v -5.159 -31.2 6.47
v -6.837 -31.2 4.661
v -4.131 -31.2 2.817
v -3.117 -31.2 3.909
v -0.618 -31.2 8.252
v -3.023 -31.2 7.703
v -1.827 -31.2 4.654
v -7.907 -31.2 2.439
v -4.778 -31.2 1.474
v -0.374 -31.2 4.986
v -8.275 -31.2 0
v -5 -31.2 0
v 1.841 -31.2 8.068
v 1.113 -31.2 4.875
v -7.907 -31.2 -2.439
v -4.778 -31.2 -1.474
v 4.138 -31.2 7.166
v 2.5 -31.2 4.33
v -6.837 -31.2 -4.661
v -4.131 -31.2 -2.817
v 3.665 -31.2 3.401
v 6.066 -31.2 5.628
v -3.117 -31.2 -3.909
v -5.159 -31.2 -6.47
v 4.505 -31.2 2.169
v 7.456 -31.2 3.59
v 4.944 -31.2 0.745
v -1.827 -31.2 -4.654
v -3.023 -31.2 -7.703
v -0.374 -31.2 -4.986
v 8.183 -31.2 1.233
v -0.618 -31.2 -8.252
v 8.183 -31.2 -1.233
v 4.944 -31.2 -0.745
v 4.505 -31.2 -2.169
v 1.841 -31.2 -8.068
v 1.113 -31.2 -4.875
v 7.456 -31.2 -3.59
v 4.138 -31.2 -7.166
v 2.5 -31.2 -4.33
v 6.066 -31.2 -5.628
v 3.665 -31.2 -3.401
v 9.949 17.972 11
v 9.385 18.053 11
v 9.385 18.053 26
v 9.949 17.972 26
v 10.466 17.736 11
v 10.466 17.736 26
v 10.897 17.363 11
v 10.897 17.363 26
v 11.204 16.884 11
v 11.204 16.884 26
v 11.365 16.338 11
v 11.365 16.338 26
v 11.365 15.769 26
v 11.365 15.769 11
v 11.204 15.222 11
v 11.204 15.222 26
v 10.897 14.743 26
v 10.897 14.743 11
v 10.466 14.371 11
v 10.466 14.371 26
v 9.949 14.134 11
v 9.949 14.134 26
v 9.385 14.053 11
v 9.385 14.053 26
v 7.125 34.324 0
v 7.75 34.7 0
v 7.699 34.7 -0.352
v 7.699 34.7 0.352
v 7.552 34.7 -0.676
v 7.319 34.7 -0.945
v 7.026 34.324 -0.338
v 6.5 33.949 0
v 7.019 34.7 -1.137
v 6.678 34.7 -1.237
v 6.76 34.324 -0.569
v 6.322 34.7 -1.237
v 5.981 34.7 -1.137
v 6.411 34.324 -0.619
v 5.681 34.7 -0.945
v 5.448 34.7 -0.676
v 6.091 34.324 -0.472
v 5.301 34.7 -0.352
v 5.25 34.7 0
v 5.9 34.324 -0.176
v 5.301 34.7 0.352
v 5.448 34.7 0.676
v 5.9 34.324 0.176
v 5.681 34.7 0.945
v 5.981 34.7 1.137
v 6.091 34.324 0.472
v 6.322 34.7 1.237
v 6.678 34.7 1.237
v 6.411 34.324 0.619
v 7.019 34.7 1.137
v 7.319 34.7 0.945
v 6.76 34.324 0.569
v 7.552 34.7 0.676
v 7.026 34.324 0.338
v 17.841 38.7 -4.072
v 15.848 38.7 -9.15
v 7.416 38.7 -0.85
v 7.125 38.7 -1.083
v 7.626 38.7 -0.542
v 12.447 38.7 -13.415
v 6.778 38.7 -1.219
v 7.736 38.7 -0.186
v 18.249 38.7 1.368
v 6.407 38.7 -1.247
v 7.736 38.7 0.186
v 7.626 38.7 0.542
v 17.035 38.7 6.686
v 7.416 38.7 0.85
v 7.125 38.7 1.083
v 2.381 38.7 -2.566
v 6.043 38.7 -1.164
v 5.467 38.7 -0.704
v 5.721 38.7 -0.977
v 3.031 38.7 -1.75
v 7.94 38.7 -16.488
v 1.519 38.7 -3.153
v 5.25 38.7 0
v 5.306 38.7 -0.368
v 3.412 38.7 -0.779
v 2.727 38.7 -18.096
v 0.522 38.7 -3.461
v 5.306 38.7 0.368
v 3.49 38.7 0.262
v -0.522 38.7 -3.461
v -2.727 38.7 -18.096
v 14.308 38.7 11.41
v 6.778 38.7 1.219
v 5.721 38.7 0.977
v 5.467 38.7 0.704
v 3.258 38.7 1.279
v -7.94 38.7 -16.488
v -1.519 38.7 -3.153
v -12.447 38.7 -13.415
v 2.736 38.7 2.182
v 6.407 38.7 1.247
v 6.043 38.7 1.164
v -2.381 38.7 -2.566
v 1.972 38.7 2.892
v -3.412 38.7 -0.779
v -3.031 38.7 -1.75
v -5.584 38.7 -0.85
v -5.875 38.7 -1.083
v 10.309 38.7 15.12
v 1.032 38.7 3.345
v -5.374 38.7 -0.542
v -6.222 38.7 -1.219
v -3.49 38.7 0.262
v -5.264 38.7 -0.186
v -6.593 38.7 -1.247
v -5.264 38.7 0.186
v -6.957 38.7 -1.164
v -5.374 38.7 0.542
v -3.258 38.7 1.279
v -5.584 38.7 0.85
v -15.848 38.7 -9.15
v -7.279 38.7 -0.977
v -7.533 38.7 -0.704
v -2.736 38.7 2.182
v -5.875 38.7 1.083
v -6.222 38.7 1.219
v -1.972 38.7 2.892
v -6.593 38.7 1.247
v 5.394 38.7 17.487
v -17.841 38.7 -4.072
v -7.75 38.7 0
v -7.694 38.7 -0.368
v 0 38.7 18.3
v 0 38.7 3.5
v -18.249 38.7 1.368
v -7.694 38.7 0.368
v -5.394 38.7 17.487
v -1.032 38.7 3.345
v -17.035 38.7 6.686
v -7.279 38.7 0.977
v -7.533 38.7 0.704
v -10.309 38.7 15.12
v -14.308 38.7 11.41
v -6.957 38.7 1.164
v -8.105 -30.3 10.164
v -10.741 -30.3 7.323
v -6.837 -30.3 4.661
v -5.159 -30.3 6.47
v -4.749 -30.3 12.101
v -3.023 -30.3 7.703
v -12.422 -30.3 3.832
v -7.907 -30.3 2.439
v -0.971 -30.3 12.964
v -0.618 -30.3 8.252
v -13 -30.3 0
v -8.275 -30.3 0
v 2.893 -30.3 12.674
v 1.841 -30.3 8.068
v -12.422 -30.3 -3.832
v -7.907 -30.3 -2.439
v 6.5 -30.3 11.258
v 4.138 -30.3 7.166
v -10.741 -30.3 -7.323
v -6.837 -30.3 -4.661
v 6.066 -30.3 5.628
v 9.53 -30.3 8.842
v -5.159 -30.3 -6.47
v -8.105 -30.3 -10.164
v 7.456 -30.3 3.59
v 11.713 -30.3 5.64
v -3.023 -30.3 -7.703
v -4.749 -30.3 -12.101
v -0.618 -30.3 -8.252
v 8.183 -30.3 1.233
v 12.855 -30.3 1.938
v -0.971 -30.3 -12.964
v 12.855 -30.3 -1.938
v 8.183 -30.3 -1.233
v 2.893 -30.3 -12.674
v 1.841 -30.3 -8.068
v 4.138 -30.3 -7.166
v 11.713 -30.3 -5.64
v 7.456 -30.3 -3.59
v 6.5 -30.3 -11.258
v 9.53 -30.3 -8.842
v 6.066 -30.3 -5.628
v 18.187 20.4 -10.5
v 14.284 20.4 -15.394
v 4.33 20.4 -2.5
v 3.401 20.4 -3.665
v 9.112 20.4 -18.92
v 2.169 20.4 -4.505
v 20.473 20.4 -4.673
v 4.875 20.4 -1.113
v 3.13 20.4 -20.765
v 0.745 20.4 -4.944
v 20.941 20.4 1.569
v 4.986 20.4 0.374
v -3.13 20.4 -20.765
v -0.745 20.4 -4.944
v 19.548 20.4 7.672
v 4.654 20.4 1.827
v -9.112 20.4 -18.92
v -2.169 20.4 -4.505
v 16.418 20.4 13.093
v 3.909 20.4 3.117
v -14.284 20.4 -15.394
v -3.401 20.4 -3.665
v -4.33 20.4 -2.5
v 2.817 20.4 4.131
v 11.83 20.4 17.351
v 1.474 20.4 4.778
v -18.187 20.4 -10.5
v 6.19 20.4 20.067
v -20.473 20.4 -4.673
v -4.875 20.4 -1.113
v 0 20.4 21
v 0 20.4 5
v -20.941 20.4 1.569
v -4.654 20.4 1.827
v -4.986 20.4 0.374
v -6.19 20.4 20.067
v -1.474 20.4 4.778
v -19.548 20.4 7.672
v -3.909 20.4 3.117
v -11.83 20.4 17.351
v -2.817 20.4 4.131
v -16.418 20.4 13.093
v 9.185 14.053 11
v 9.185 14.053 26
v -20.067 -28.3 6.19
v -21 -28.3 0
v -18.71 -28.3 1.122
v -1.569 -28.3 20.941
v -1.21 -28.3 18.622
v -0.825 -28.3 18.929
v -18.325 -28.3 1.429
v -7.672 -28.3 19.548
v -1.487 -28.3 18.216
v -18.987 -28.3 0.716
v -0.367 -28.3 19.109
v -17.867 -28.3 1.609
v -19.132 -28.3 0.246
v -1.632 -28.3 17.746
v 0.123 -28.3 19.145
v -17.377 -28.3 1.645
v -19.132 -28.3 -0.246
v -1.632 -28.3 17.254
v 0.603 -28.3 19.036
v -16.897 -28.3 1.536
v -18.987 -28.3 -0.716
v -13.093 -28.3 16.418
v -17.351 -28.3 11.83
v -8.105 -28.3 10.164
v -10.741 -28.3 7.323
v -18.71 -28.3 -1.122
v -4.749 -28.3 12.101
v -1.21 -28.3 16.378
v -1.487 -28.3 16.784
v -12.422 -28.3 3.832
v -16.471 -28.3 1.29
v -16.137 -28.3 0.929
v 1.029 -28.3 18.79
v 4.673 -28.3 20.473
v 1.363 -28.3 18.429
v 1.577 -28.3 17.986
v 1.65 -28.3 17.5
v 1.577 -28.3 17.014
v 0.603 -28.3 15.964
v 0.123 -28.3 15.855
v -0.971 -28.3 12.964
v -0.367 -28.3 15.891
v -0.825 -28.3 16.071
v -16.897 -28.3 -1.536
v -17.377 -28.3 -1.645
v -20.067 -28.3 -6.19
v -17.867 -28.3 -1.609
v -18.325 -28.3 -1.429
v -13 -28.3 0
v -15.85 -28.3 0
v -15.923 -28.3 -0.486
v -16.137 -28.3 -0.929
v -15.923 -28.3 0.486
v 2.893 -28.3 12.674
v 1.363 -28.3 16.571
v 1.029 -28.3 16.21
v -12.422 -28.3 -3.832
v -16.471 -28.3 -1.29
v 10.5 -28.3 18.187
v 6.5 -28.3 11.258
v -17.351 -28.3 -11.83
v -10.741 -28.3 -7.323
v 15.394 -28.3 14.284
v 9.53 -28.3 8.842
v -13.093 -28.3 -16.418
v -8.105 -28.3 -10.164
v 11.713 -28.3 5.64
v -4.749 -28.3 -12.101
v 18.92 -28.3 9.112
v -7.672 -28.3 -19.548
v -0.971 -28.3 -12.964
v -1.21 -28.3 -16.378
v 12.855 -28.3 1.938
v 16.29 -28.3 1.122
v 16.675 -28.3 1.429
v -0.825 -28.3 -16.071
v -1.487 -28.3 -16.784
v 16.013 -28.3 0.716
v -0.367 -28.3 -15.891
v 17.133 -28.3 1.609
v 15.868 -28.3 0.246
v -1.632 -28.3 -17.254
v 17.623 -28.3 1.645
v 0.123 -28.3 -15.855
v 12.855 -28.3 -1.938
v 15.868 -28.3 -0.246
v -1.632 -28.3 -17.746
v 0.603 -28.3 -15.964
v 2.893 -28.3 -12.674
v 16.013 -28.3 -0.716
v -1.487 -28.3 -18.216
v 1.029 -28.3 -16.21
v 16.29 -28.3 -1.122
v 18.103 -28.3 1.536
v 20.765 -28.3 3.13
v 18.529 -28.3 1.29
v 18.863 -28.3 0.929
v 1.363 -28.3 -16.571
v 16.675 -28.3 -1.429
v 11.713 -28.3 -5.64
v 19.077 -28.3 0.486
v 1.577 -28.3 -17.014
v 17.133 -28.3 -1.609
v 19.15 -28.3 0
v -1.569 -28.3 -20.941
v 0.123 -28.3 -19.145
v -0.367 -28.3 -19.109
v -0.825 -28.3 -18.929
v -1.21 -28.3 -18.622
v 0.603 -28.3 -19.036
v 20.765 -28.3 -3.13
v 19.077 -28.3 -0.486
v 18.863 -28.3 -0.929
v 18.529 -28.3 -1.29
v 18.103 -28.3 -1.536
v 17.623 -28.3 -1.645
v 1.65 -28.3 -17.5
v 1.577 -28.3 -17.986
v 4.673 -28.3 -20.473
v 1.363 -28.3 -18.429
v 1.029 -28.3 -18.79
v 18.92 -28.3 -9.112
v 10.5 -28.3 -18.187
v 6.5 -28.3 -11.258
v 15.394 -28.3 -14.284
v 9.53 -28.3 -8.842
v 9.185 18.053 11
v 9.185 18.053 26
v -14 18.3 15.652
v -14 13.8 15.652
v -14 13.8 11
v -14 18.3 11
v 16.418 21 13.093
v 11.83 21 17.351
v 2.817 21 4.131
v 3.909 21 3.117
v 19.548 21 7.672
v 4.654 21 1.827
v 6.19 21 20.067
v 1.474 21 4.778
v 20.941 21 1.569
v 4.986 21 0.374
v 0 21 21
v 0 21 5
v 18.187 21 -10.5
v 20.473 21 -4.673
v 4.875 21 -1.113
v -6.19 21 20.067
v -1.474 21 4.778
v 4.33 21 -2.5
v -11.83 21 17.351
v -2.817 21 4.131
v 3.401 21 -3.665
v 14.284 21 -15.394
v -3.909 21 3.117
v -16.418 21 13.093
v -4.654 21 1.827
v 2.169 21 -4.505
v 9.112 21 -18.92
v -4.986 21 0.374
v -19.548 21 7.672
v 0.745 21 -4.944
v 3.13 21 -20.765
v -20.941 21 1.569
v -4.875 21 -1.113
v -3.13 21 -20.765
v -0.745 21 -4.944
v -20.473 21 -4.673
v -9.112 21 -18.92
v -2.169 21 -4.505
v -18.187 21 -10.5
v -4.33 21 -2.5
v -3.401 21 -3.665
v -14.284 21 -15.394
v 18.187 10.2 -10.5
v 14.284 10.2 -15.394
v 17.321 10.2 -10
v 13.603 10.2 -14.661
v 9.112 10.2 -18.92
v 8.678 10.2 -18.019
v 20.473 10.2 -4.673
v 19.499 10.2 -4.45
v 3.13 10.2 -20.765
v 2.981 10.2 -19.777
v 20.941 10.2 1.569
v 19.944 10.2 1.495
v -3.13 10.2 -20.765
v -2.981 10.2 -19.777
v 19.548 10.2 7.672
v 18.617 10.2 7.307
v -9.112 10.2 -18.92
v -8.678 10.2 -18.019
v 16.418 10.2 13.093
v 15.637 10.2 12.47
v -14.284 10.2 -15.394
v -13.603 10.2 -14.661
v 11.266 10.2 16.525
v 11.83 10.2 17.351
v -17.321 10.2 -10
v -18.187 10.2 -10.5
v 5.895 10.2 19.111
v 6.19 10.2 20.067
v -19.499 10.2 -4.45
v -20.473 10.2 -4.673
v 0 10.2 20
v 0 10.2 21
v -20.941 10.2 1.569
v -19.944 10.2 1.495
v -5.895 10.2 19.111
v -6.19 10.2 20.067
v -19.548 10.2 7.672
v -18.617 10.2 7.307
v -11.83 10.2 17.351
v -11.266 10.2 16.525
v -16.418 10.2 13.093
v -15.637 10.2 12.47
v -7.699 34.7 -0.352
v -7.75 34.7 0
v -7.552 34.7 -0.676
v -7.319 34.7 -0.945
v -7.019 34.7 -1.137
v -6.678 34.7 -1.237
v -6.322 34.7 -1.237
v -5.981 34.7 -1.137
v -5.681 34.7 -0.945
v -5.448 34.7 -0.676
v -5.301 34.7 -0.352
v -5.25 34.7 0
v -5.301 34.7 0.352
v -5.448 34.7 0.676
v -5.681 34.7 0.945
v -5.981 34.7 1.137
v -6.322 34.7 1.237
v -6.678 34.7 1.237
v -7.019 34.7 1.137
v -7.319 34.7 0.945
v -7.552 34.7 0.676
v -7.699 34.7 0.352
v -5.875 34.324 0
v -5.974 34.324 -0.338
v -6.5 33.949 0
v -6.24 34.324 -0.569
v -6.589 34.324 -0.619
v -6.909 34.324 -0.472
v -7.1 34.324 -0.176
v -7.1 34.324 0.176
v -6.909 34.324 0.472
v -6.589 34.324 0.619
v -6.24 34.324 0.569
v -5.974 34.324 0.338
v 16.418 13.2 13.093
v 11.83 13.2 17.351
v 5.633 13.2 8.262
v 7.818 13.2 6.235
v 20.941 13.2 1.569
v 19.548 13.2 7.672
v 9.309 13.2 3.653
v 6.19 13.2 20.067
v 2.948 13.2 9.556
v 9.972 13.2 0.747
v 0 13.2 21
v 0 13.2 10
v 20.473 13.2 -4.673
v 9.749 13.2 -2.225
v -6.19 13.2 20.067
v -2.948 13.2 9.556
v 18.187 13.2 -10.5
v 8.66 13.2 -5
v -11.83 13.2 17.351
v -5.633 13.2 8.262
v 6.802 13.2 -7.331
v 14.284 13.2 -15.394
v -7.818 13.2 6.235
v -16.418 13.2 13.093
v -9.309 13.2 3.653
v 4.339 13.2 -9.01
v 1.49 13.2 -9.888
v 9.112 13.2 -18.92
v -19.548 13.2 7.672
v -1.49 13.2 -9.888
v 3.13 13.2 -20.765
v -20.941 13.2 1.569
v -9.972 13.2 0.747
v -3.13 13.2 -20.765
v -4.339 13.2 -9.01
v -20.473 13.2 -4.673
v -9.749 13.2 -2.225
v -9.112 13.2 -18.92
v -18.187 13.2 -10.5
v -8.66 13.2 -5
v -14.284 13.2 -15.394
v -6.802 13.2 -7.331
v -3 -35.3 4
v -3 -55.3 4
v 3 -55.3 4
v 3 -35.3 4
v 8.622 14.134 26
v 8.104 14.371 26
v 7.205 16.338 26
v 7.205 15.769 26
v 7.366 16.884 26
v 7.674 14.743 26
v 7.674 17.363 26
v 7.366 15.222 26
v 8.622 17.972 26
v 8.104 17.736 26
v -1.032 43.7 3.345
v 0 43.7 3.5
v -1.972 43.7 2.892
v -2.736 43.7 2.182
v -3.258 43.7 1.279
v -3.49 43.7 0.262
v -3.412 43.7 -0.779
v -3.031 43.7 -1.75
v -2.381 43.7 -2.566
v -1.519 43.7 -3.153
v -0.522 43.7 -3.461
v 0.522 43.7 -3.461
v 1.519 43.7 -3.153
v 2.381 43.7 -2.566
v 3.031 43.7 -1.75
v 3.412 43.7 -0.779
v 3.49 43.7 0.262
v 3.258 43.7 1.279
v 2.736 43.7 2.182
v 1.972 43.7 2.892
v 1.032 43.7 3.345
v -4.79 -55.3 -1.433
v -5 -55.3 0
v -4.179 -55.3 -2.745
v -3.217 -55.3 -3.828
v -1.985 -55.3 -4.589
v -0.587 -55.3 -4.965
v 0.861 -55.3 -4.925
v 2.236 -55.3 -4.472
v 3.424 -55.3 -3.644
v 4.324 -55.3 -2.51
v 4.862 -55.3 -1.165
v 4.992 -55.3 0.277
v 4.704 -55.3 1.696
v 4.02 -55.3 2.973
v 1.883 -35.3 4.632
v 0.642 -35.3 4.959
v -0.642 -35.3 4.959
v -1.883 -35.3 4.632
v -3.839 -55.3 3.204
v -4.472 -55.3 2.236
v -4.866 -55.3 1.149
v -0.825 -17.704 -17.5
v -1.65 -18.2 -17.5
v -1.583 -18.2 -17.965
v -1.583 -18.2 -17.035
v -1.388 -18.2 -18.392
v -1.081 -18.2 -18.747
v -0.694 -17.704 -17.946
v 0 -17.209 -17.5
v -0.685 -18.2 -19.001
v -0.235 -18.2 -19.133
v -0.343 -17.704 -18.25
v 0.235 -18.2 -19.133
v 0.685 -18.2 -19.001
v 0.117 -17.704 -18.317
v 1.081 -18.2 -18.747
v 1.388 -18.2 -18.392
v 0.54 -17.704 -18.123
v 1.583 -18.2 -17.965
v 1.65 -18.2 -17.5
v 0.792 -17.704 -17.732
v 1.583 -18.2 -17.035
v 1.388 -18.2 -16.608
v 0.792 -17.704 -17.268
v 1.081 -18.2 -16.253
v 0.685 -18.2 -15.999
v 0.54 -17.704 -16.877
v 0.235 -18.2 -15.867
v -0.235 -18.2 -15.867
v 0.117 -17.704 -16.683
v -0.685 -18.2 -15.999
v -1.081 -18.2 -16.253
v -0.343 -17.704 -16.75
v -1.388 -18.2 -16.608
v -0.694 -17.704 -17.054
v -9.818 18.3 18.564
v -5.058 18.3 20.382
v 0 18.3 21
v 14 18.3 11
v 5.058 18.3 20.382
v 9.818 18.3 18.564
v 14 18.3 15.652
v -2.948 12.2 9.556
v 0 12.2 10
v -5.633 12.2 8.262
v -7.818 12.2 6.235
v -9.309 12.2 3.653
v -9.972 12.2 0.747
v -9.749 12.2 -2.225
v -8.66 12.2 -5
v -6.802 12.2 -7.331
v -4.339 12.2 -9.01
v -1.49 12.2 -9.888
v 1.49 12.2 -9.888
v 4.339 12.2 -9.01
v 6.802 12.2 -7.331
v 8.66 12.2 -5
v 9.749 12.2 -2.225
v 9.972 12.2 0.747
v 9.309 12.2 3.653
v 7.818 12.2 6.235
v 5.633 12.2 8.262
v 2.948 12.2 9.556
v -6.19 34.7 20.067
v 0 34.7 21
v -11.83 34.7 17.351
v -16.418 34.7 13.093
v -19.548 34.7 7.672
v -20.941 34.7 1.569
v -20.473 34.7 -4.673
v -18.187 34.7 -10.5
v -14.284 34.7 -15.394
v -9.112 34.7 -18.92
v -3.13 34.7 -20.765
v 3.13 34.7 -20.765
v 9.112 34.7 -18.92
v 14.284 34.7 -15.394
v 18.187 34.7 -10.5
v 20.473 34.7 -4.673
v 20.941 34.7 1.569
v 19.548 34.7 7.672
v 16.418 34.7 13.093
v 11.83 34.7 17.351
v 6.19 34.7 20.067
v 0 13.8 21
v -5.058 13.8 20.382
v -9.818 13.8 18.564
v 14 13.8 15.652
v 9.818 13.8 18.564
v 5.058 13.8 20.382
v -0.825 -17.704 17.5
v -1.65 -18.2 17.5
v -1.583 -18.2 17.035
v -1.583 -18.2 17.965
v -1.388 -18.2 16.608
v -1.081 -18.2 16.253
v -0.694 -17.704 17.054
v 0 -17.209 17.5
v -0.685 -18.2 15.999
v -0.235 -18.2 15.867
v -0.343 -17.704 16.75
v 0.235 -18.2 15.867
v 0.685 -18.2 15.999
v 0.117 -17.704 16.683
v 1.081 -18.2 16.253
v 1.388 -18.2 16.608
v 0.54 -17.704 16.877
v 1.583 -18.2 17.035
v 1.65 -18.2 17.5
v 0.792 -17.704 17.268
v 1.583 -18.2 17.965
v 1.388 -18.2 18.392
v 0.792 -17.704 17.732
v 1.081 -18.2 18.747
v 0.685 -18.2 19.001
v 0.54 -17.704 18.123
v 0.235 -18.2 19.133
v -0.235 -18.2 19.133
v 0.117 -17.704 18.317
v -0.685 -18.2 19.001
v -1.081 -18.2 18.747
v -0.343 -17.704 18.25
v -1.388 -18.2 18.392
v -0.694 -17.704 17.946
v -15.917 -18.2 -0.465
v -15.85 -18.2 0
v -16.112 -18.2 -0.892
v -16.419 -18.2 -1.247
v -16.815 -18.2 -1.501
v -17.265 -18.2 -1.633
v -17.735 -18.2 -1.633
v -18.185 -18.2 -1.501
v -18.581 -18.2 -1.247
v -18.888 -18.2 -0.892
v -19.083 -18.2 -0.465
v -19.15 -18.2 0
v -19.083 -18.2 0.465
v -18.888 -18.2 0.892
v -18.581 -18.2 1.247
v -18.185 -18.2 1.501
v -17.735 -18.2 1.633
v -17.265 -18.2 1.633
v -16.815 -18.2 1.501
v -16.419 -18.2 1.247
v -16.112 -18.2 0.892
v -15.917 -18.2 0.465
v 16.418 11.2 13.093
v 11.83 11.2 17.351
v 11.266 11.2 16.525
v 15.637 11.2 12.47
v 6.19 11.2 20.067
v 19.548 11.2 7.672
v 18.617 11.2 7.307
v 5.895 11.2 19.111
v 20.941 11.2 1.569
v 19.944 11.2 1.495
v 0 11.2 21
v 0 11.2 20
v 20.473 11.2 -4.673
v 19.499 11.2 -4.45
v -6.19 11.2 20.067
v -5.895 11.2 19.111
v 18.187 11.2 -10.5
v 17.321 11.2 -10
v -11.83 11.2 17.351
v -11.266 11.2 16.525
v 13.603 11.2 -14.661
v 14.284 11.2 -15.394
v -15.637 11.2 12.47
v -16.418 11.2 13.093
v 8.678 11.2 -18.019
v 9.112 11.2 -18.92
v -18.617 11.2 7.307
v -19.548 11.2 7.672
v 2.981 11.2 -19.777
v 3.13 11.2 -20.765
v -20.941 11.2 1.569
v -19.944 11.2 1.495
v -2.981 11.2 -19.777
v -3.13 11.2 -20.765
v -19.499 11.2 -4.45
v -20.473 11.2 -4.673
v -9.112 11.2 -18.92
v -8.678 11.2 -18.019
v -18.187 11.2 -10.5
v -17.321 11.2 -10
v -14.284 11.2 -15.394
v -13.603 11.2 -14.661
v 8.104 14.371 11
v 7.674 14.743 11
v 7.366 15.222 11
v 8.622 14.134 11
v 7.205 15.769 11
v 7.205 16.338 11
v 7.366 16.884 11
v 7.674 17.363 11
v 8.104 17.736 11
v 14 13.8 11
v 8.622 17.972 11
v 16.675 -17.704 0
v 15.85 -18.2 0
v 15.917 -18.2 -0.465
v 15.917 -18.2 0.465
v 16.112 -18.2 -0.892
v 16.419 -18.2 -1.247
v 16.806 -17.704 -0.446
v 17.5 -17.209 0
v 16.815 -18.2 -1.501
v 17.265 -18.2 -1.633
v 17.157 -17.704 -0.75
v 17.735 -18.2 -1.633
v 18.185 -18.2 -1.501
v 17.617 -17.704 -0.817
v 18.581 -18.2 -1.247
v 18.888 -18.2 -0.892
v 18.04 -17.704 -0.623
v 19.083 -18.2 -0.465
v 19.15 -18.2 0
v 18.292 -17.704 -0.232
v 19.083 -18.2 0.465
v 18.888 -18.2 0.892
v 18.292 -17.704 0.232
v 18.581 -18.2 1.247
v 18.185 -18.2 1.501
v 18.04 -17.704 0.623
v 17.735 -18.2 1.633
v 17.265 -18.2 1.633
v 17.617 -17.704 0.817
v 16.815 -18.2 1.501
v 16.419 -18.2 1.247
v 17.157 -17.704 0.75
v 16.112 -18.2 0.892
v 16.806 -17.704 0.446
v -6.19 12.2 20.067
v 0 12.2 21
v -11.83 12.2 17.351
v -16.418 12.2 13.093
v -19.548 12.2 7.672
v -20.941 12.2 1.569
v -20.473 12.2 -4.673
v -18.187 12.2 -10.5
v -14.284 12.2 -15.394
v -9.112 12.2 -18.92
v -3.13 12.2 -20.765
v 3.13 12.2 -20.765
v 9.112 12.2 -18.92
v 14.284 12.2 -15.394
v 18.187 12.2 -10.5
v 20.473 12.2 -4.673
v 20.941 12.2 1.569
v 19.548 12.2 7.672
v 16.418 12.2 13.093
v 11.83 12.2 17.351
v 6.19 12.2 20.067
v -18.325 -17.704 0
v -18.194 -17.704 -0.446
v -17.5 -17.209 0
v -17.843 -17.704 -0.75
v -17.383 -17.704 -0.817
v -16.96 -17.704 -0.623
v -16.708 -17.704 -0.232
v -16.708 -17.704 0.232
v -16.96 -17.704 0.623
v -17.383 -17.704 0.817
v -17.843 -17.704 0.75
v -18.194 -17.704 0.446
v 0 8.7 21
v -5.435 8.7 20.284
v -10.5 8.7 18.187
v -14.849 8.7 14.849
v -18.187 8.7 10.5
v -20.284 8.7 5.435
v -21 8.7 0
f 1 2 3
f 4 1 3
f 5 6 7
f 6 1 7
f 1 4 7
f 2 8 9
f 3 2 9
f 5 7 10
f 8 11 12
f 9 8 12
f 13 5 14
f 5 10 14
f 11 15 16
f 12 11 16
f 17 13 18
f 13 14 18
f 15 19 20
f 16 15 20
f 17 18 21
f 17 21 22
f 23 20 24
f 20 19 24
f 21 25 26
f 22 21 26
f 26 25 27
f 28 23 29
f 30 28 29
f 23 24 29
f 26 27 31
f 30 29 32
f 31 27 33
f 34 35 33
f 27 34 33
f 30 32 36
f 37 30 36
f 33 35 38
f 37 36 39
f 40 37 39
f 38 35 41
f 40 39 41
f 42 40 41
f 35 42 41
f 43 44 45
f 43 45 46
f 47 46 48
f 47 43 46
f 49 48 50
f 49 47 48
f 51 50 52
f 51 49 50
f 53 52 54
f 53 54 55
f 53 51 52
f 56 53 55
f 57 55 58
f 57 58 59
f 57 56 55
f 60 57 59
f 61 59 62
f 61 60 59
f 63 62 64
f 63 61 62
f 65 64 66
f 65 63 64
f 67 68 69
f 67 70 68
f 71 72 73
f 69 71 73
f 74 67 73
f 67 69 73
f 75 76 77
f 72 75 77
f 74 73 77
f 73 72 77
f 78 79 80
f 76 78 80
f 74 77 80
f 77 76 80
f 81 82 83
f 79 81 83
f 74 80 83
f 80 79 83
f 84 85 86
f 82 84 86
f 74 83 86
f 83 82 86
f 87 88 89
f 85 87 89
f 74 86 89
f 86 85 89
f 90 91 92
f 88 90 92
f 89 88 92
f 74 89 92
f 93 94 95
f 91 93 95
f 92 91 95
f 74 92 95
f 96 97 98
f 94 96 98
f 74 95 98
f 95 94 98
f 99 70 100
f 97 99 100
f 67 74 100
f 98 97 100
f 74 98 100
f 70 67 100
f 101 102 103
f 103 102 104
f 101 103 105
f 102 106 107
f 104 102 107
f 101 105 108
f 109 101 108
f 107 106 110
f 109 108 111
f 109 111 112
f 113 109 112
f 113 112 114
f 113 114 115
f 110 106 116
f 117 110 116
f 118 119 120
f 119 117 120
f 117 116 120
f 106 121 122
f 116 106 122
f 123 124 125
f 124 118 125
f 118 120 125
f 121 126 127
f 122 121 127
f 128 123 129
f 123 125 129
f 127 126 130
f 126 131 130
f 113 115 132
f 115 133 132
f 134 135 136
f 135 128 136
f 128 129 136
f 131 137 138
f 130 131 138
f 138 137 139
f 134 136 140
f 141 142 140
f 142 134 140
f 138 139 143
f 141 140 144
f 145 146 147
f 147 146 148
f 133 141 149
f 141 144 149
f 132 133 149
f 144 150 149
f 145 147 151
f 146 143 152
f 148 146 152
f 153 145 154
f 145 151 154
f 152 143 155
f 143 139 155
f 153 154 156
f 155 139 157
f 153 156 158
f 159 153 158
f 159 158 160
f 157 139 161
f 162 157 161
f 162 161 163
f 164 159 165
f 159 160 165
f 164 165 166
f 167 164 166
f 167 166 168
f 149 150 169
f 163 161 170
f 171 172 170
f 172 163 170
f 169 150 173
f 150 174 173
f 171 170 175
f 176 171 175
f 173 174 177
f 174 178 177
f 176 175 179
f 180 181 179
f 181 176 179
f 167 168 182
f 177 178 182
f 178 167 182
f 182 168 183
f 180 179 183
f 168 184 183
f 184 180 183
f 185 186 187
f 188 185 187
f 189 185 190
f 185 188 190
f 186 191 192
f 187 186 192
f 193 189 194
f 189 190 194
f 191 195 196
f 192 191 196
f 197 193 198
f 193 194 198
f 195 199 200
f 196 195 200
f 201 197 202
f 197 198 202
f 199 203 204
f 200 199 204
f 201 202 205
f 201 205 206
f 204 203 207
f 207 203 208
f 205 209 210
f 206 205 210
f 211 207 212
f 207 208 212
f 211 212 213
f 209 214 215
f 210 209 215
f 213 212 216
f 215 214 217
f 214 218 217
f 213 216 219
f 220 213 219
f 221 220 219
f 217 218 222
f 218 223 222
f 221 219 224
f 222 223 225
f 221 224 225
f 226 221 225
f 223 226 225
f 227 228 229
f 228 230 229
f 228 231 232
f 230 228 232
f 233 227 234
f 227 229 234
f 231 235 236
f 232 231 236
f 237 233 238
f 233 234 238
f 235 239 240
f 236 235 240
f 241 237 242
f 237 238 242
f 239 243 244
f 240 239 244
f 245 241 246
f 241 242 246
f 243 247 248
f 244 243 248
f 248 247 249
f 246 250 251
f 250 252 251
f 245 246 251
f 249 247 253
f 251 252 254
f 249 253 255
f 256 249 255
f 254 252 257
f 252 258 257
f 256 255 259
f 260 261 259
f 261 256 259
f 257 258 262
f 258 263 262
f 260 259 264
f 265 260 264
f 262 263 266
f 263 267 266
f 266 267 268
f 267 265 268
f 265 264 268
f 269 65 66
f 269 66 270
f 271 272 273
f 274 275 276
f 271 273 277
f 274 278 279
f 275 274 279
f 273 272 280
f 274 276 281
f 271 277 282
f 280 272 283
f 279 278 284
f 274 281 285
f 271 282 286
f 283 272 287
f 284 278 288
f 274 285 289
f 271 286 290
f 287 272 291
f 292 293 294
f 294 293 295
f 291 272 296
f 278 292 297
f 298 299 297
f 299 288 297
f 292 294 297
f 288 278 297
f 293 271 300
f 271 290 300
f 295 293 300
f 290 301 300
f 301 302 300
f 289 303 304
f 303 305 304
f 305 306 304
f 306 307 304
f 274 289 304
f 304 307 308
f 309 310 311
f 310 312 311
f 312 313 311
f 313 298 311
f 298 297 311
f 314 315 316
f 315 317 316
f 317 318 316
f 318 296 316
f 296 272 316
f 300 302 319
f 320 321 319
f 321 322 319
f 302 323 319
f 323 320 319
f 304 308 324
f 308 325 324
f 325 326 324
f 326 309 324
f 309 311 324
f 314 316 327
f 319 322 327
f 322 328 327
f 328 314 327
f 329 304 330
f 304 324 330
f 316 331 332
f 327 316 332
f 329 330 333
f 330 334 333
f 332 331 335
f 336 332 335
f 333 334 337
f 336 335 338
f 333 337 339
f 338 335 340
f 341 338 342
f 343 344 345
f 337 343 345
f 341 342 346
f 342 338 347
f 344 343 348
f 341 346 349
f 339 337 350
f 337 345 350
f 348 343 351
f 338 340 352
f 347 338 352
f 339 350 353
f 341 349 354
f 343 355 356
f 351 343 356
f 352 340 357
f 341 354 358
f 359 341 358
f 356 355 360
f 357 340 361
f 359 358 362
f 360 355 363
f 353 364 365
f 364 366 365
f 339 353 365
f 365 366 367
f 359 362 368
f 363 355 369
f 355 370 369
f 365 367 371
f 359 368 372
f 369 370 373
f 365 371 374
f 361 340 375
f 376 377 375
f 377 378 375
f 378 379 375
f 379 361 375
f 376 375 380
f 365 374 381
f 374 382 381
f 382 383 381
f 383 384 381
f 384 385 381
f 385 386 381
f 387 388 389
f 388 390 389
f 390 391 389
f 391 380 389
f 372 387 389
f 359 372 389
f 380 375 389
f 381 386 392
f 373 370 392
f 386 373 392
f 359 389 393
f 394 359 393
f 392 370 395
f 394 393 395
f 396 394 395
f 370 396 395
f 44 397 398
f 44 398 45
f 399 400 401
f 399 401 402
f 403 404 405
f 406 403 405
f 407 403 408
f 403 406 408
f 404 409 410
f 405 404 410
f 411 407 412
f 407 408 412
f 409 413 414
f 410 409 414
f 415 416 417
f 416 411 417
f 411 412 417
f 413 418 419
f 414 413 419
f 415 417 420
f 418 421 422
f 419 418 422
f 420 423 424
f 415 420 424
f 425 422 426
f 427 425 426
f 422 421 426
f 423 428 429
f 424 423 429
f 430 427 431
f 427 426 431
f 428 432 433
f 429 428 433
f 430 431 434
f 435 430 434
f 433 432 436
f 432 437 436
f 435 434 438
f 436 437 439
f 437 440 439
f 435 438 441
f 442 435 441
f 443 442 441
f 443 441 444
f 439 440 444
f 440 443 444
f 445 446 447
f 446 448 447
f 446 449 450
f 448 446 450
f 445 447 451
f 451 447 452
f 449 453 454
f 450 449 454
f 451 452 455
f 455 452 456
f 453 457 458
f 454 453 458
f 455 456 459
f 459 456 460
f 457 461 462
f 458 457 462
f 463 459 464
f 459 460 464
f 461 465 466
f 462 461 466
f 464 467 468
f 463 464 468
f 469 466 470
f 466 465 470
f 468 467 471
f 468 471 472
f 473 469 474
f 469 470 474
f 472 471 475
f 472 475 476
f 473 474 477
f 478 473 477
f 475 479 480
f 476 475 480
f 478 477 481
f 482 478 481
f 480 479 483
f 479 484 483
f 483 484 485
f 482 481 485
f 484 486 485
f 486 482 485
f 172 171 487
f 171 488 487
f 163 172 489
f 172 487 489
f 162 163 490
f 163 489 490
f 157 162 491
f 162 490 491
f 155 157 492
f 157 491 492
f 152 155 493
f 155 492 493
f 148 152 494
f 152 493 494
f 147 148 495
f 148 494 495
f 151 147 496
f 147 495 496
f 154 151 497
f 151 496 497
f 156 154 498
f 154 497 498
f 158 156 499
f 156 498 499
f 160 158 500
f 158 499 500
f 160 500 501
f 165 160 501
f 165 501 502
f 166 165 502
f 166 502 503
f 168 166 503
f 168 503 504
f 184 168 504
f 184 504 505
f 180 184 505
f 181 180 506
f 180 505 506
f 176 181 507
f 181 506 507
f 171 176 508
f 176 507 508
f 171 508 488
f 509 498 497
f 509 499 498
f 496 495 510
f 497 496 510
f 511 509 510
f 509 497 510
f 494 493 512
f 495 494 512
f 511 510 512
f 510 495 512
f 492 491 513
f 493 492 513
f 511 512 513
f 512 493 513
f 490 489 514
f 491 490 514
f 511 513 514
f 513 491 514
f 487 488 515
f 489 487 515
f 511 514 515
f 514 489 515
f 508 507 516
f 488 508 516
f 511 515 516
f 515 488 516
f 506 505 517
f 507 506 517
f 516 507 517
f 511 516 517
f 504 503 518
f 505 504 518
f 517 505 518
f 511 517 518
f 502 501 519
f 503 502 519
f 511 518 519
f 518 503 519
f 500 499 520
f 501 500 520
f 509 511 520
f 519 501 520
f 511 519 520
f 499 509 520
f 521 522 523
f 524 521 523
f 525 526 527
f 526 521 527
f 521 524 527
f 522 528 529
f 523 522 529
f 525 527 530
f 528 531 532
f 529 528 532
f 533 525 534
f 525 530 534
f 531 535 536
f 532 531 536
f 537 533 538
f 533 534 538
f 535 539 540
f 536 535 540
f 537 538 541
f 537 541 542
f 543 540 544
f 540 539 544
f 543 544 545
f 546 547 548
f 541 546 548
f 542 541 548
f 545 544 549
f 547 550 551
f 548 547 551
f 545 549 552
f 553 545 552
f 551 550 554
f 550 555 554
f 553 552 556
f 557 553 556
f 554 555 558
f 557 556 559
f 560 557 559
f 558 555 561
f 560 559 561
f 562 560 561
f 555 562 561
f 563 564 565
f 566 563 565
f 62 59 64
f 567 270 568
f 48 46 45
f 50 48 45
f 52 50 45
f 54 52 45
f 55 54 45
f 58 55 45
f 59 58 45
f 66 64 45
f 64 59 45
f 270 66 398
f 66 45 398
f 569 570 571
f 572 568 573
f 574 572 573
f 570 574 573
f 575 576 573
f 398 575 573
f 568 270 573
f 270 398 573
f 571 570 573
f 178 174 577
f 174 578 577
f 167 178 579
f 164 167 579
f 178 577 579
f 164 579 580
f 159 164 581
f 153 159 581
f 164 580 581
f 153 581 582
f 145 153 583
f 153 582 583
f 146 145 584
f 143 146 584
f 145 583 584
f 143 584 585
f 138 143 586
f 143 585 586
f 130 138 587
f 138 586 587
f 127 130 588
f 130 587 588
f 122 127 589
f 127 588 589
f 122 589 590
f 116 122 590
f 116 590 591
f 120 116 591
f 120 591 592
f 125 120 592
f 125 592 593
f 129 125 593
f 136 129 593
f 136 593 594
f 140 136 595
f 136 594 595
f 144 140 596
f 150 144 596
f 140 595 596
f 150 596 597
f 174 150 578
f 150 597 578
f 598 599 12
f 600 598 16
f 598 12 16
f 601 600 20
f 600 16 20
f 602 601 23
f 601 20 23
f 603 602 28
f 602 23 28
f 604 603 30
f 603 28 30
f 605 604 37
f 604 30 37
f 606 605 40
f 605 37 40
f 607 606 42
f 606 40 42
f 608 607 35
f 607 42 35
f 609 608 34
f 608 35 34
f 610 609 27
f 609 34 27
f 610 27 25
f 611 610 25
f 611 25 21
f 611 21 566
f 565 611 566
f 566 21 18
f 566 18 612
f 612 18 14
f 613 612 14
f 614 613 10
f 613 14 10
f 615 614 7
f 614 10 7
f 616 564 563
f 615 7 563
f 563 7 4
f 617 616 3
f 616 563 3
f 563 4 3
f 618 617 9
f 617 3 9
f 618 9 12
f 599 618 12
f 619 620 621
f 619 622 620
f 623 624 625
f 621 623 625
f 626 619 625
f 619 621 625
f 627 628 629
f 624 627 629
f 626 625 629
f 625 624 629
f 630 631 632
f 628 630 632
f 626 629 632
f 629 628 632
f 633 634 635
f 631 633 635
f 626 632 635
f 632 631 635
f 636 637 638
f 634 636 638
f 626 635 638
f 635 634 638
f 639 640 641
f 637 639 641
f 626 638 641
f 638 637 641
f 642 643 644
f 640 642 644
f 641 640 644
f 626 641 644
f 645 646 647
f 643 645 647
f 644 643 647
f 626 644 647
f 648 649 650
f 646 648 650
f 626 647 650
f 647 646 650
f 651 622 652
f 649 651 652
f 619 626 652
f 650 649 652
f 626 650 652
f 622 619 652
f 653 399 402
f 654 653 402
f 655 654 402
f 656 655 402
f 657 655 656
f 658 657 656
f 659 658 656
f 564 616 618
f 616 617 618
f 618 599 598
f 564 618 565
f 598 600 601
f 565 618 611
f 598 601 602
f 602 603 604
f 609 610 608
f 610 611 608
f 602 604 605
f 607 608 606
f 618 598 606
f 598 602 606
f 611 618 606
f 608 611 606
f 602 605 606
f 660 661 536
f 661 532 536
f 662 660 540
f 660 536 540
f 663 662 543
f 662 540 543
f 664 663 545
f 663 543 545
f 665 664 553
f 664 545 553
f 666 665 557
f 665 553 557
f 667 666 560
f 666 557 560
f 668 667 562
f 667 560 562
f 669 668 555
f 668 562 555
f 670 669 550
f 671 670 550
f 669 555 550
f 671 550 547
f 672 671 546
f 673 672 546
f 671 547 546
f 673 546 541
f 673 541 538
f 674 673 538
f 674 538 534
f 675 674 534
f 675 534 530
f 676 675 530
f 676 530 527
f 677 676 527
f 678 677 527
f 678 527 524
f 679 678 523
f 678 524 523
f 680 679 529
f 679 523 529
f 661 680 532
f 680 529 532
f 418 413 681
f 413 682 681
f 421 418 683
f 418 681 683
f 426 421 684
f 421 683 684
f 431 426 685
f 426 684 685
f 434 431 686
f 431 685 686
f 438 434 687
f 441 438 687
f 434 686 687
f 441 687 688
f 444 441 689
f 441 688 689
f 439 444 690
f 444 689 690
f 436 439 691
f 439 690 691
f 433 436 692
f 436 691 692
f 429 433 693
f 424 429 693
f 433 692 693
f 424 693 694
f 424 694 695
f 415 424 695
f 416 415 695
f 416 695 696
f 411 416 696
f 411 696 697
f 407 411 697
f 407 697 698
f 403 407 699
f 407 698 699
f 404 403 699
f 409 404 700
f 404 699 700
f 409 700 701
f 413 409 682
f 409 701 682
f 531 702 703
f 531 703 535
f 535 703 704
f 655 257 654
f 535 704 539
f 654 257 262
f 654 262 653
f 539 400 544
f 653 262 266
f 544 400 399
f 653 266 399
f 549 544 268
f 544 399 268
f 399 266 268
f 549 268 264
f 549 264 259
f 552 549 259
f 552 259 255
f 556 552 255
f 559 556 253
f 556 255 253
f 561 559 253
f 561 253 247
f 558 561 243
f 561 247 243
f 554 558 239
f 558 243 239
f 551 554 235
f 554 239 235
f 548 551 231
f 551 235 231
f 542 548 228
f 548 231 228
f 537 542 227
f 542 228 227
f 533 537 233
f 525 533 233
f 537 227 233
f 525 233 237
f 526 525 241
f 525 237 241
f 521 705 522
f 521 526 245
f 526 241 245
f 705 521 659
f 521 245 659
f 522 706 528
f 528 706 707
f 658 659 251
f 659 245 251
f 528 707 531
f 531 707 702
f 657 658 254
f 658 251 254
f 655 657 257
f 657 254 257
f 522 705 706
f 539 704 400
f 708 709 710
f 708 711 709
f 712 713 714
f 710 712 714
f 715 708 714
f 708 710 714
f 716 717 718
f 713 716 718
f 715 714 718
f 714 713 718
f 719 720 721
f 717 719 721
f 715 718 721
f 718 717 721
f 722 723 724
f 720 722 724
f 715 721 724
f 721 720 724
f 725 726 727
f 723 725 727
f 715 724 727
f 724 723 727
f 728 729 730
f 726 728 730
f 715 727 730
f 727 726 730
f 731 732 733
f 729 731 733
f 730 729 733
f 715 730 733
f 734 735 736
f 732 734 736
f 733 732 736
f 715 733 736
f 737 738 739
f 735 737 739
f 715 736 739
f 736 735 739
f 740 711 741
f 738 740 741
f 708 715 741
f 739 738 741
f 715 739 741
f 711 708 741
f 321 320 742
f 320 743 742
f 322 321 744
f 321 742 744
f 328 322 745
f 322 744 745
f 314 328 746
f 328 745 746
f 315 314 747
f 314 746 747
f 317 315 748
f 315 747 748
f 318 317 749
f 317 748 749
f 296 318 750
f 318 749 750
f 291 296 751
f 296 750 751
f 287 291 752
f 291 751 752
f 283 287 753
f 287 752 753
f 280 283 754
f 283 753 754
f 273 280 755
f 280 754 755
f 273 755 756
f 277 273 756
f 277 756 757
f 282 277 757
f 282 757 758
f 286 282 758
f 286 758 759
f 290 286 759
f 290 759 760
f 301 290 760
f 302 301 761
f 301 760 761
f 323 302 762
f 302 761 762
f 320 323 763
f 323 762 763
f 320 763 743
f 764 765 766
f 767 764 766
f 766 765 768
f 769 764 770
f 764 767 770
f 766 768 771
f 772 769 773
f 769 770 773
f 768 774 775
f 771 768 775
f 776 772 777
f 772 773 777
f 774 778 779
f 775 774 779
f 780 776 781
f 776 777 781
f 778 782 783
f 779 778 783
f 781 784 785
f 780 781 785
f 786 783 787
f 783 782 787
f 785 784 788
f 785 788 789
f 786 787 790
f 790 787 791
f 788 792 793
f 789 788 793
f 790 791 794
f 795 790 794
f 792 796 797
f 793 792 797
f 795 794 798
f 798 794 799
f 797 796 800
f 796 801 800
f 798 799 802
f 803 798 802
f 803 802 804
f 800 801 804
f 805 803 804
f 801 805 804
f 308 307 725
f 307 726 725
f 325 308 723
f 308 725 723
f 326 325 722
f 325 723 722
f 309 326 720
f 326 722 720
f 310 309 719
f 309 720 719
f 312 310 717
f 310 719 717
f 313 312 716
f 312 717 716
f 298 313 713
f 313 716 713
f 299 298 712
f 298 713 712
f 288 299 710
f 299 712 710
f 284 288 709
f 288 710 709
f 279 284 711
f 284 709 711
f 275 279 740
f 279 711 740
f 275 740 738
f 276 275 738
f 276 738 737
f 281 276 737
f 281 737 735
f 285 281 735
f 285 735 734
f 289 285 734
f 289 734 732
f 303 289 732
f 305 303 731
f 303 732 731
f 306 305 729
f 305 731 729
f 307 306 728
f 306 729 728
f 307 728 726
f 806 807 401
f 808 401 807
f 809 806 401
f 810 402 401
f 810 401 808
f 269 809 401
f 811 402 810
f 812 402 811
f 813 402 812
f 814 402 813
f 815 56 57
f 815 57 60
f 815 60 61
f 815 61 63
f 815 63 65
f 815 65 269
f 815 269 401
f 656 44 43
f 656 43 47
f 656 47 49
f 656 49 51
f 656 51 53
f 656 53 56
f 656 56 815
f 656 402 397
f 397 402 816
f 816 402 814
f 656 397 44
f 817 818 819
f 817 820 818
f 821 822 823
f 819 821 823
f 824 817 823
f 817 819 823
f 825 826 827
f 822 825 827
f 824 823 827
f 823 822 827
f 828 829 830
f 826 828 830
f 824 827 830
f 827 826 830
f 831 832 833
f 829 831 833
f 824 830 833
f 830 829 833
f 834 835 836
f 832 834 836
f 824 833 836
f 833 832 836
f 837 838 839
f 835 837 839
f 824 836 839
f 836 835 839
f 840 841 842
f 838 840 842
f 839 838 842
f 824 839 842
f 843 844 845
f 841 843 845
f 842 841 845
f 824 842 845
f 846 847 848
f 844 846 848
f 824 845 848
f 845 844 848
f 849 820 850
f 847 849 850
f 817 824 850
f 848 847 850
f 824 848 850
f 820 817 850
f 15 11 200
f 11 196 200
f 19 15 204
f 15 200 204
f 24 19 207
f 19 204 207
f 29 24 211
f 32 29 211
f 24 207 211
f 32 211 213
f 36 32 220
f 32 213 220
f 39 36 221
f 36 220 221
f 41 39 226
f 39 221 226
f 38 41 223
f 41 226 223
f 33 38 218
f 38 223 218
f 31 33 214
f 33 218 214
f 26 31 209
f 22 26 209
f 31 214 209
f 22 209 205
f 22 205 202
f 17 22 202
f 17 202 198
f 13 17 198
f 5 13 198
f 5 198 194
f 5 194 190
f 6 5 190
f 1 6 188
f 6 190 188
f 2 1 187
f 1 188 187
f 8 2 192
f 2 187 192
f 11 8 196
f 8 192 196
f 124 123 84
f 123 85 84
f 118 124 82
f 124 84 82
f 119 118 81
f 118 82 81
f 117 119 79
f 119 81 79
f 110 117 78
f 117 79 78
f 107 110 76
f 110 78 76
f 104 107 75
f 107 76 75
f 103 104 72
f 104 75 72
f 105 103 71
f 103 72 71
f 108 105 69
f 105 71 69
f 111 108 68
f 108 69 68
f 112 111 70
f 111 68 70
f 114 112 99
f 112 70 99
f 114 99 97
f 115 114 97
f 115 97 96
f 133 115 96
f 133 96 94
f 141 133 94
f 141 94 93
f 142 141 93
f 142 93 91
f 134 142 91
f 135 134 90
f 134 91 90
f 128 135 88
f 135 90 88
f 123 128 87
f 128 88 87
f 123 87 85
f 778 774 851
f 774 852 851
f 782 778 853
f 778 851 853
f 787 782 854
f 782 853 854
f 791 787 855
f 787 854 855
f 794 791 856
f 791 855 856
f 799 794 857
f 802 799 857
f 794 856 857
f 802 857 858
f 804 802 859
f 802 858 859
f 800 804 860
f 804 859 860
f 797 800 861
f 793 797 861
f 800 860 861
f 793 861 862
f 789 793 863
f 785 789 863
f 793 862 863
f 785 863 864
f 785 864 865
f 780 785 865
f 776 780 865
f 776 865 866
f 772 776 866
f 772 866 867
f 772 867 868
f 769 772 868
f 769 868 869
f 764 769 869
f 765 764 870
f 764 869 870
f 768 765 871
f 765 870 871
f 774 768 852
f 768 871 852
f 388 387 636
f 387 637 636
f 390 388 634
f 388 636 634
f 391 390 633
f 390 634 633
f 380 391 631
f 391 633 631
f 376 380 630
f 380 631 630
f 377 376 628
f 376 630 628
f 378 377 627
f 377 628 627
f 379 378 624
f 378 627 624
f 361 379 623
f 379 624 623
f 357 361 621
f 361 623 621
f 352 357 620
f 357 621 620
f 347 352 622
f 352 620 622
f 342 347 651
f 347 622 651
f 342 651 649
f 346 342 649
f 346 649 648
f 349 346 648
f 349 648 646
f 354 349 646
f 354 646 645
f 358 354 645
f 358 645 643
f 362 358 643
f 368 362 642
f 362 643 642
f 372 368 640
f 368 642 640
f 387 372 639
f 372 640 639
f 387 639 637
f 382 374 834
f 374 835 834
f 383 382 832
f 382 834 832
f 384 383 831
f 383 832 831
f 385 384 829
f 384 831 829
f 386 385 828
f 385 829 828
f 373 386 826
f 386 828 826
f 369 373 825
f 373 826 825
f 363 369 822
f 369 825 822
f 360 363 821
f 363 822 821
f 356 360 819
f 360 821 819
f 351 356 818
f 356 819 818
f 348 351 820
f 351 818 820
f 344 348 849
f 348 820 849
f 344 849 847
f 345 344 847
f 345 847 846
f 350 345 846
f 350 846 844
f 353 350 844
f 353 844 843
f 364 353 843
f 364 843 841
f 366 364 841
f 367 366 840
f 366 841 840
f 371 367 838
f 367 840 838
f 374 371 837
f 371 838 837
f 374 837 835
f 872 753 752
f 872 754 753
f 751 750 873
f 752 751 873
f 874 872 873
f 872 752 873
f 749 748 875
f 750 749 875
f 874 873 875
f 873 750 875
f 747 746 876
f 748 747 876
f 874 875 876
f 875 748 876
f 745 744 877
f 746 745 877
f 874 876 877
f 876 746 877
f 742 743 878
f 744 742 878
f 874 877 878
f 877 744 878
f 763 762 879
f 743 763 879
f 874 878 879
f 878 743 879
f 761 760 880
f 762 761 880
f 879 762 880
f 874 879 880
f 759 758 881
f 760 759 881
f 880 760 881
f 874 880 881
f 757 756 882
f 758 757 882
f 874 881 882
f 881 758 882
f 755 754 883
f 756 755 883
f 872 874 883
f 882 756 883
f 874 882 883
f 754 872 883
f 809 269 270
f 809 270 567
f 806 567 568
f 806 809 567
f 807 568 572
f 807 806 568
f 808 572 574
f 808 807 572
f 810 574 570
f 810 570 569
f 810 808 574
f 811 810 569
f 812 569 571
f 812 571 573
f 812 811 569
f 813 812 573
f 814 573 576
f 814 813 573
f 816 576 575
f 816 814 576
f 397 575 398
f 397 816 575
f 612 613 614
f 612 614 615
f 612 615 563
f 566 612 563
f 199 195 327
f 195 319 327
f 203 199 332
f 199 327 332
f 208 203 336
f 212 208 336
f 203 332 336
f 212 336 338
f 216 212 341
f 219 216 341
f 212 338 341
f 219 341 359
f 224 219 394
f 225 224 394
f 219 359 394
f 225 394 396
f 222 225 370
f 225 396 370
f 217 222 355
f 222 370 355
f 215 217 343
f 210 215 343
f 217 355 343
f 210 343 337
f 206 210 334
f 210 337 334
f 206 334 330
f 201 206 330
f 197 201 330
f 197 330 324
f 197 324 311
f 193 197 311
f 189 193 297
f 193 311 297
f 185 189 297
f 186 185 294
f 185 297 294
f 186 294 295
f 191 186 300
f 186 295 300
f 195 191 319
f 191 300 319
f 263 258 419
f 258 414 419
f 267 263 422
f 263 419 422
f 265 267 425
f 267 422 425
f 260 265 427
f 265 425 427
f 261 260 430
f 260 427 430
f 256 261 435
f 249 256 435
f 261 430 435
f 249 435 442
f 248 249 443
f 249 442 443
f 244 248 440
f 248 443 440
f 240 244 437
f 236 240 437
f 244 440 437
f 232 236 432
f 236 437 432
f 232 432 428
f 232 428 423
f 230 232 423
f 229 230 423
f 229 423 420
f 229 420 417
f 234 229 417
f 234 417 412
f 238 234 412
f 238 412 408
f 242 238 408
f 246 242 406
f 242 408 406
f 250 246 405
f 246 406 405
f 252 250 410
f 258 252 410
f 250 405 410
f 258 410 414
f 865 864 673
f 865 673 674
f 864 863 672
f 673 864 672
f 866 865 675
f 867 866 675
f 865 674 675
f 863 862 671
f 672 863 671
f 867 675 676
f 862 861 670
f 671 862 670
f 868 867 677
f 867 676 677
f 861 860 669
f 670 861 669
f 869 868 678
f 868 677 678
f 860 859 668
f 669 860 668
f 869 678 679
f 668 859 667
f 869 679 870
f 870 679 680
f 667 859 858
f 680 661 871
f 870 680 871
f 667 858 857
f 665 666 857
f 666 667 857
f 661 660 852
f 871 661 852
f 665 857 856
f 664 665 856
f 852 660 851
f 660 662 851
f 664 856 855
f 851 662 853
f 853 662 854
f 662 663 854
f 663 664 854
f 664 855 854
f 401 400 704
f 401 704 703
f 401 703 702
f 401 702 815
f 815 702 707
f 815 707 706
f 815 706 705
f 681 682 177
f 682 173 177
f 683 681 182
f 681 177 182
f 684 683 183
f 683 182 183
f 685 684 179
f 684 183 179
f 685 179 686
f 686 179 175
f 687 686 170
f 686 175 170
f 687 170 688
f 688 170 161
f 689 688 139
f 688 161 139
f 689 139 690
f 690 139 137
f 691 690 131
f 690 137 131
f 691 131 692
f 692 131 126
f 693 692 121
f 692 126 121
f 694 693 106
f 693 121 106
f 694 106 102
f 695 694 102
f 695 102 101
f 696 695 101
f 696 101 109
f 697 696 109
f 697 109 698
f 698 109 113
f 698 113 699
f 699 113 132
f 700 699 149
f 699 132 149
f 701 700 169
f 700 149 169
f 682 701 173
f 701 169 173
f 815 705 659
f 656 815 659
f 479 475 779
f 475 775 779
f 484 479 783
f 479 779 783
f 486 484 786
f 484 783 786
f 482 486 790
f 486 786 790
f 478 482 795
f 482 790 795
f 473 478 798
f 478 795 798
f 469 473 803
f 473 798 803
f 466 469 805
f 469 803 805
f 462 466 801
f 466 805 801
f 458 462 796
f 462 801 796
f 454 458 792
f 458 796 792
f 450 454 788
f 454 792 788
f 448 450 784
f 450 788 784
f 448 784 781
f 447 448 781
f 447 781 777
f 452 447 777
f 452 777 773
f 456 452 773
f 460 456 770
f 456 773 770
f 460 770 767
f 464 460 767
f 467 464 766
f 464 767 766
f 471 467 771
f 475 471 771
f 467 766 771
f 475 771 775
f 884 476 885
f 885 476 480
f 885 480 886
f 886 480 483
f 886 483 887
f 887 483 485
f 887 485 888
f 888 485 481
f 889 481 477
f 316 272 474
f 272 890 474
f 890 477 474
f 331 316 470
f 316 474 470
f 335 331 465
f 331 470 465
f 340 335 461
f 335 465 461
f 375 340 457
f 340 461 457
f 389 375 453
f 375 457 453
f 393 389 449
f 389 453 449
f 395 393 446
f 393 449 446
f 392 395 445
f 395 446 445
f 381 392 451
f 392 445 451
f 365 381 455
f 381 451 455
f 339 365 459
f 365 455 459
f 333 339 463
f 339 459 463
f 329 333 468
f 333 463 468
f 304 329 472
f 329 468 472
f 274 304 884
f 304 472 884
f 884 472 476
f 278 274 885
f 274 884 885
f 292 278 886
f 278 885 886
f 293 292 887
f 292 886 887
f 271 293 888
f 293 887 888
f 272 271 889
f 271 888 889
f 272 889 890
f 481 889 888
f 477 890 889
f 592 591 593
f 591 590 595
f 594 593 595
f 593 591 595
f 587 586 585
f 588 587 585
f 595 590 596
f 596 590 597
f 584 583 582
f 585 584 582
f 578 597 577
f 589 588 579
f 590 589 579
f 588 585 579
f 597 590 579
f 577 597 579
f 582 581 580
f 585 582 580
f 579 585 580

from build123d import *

# Parameters (mm, degrees)
SKETCH_2_W             = 28
SKETCH_2_H             = 4.5
CUT_EXTRUDE_1_DEPTH    = 10
EXTRUDE_1_DEPTH        = 15
HOLE_WIZARD_M3_1_D     = 2.5
HOLE_WIZARD_M3_1_DEPTH = 4
HOLE_WIZARD_M3_1_TIP   = 0.751075774
CUT_EXTRUDE_START      = -20
CUT_EXTRUDE_2_DEPTH    = 20
HOLE_WIZARD_M4_1_D     = 3.3
HOLE_WIZARD_M4_1_DEPTH = 10.1
HOLE_WIZARD_M4_1_TIP   = 0.991420021


with BuildPart() as part:
    # 草图1 → 旋转1 (revolve)
    with BuildSketch(Plane.XY, mode=Mode.PRIVATE) as revolve_1_sk:
        Polygon((0, 0), (4.1, 0), (4.1, 6.7), (13.4, 6.7), (13.4, 8.7), (21, 8.7), (21, 10.2), (20, 10.2), (20, 11.2), (21, 11.2), (21, 12.2), (10, 12.2), (10, 13.2), (21, 13.2), (21, 20.4), (5, 20.4), (5, 21), (21, 21), (21, 34.7), (18.3, 38.7), (3.5, 38.7), (3.5, 43.7), (0, 43.7), align=None)
    revolve(revolve_1_sk.sketch.rotate(Axis((0, 43.7, 0), (0, -1, 0)), 90), axis=Axis((0, 43.7, 0), (0, -1, 0)))

    # 草图2 → 切除-拉伸1 (cut)
    with BuildSketch(Plane.XY.offset(21)):
        with Locations((0, 16.05)):
            Rectangle(SKETCH_2_W, SKETCH_2_H)
    extrude(amount=-CUT_EXTRUDE_1_DEPTH, mode=Mode.SUBTRACT)

    # 草图3 → 凸台-拉伸1 (add)
    with BuildSketch(Plane.XY.offset(11)):
        with BuildLine():
            Line((9.185056323, 18.053194417), (9.385056323, 18.053194417))
            ThreePointArc((9.385056323, 18.053194417), (11.385056323, 16.053194417), (9.385056323, 14.053194417))
            Line((9.385056323, 14.053194417), (9.185056323, 14.053194417))
            ThreePointArc((9.185056323, 14.053194417), (7.185056323, 16.053194417), (9.185056323, 18.053194417))
        make_face()
    extrude(amount=EXTRUDE_1_DEPTH)

    # M3 螺纹孔1
    with Locations(Plane(origin=(0, 38.7, 0), x_dir=(1, 0, 0), z_dir=(0, 1, 0))):
        with Locations((-6.5, 0), (6.5, 0)):
            Hole(HOLE_WIZARD_M3_1_D / 2, depth=HOLE_WIZARD_M3_1_DEPTH)
            with Locations((0, 0, -(HOLE_WIZARD_M3_1_DEPTH + HOLE_WIZARD_M3_1_TIP / 2))):  # 118° drill point
                Cone(0, HOLE_WIZARD_M3_1_D / 2, HOLE_WIZARD_M3_1_TIP, mode=Mode.SUBTRACT)

    # 草图7 → 旋转2 (revolve)
    with BuildSketch(Plane.XY, mode=Mode.PRIVATE) as revolve_2_sk:
        Polygon((0, -55.3), (5, -55.3), (5, -31.2), (8.275, -31.2), (8.275, -30.3), (13, -30.3), (13, -28.3), (21, -28.3), (21, 8.7), (0, 8.7), align=None)
    revolve(revolve_2_sk.sketch.rotate(Axis((0, 8.7, 0), (0, -1, 0)), 180), axis=Axis((0, 8.7, 0), (0, -1, 0)))

    # 草图8 → 切除-拉伸2 (cut)
    with BuildSketch(Plane.XZ.offset(55.3).offset(CUT_EXTRUDE_START)):
        with BuildLine():
            Line((-3, 4), (3, 4))
            ThreePointArc((3, 4), (0, 5), (-3, 4))
        make_face()
    extrude(amount=CUT_EXTRUDE_2_DEPTH, mode=Mode.SUBTRACT)

    # M4 螺纹孔1
    with Locations(Plane(origin=(0, -28.3, 0), x_dir=(-1, 0, 0), z_dir=(0, -1, 0))):
        with Locations((17.5, 0), (0, -17.5), (-17.5, 0), (0, 17.5)):
            Hole(HOLE_WIZARD_M4_1_D / 2, depth=HOLE_WIZARD_M4_1_DEPTH)
            with Locations((0, 0, -(HOLE_WIZARD_M4_1_DEPTH + HOLE_WIZARD_M4_1_TIP / 2))):  # 118° drill point
                Cone(0, HOLE_WIZARD_M4_1_D / 2, HOLE_WIZARD_M4_1_TIP, mode=Mode.SUBTRACT)


solid = part.part
